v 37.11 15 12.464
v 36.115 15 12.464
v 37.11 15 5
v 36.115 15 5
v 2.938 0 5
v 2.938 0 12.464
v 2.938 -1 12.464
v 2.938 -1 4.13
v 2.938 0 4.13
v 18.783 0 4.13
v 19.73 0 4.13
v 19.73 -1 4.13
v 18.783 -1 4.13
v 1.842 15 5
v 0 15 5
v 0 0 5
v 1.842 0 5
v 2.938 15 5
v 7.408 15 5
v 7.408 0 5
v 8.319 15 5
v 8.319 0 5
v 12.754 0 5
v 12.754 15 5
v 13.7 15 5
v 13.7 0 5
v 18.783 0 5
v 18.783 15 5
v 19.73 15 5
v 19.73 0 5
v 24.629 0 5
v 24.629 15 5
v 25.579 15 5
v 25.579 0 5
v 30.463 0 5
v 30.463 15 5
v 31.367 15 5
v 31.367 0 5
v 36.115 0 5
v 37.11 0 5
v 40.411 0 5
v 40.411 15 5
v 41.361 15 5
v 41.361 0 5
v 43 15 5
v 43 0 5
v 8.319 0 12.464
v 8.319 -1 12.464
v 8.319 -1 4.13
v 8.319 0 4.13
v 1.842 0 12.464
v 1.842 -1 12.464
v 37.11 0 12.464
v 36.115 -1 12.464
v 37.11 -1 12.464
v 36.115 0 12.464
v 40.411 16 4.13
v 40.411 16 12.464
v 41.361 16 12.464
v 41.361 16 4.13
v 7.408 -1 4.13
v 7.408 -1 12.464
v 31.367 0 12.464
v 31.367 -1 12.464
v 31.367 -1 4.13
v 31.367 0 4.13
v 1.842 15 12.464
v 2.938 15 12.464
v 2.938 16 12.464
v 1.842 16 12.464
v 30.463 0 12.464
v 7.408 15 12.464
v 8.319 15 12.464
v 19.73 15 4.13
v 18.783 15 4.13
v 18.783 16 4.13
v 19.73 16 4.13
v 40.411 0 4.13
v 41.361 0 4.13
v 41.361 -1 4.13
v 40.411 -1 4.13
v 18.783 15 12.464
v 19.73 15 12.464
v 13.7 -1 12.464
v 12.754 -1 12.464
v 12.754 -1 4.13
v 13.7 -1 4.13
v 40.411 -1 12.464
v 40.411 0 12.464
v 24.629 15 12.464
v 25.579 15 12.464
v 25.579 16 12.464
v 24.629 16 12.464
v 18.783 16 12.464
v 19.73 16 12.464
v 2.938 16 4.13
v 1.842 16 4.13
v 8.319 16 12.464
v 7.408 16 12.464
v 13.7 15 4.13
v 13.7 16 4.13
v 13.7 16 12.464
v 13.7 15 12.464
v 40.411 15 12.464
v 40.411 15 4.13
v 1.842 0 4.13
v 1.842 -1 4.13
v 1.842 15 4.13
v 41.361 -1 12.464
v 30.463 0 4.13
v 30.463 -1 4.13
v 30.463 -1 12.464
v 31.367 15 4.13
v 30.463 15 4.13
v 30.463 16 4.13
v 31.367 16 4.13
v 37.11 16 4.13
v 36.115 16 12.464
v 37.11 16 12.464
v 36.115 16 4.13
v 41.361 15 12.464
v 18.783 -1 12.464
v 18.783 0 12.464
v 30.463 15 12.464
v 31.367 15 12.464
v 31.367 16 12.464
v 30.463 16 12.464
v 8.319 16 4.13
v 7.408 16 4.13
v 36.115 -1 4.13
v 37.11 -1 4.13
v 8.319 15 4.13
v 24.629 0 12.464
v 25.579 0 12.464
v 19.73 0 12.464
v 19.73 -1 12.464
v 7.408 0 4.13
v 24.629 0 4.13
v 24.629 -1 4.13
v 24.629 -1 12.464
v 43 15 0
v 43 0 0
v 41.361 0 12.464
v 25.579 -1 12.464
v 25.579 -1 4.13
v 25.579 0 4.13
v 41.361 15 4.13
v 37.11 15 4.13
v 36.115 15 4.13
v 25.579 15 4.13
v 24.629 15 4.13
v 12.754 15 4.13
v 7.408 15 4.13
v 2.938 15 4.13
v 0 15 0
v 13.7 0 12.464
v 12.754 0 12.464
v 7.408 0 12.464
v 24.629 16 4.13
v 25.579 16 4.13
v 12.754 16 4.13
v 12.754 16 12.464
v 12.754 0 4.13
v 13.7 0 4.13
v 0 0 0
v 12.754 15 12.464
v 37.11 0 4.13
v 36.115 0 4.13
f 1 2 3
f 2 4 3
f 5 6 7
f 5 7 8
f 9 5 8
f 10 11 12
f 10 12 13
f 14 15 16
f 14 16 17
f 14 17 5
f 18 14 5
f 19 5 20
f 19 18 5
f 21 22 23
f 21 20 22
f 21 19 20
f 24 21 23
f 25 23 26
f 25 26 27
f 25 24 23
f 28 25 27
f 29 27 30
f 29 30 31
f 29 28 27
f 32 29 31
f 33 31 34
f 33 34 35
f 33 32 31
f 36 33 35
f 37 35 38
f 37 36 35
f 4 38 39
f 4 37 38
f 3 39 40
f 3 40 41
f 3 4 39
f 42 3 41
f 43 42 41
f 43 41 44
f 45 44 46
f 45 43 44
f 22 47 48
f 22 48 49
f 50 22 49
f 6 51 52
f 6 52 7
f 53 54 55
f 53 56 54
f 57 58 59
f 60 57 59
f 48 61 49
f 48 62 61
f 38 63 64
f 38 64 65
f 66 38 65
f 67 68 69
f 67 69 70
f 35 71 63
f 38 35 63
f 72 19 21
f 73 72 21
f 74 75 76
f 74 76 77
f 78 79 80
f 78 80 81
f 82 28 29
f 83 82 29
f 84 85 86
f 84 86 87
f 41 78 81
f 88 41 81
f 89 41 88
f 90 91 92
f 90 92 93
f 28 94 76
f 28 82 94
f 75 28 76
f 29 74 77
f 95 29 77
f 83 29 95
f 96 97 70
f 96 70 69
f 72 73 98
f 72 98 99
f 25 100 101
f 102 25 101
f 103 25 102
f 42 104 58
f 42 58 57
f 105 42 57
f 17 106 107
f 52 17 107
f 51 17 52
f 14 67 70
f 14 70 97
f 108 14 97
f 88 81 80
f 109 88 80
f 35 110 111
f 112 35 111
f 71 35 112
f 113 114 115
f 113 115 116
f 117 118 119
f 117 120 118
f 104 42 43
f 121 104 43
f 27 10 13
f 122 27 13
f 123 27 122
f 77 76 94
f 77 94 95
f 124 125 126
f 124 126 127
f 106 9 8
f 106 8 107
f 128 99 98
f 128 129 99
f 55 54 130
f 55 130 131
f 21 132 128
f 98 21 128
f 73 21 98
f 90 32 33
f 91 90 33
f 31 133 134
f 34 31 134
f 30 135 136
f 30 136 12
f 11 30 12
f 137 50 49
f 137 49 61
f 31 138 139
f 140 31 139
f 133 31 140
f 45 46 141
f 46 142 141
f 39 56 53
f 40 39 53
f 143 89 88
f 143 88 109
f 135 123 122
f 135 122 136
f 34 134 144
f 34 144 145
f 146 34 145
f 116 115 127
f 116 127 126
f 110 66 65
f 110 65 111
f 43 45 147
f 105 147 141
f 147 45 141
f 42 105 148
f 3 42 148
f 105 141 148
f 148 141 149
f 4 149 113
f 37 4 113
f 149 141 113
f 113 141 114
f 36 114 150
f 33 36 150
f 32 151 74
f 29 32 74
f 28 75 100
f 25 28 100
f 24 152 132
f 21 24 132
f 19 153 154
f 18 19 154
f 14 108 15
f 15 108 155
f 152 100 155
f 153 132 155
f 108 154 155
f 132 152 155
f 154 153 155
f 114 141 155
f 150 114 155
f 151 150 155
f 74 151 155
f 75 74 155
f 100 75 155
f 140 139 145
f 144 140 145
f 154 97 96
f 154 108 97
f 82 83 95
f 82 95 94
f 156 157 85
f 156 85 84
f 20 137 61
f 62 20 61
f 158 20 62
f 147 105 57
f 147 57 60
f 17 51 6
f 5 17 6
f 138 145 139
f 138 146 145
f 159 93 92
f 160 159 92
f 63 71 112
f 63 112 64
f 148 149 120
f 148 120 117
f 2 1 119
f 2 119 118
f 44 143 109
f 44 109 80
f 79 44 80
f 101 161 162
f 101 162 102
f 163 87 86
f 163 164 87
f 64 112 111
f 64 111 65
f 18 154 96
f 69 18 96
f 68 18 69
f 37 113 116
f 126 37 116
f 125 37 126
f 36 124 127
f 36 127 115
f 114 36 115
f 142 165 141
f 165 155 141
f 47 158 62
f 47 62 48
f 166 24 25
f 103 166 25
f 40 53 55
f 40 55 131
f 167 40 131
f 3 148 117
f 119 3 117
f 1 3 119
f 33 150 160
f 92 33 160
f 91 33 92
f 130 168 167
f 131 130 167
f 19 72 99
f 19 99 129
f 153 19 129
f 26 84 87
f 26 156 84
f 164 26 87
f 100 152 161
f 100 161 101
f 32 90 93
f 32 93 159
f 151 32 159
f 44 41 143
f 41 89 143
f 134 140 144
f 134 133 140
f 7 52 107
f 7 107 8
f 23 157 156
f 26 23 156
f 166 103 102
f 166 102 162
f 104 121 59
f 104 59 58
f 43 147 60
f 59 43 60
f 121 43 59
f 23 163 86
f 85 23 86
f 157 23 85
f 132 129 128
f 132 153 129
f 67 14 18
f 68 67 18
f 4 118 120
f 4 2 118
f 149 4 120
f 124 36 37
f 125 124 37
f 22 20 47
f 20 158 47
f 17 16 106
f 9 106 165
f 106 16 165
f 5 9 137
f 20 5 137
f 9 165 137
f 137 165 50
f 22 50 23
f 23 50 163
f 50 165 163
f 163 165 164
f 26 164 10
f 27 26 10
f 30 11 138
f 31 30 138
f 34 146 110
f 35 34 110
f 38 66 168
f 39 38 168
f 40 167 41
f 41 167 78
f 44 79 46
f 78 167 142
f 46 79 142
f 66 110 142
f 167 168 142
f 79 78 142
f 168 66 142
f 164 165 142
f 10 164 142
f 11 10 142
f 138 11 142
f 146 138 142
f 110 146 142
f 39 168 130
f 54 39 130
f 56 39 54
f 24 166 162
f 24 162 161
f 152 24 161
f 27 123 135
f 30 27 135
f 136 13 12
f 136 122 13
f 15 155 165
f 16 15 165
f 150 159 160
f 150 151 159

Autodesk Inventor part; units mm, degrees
ref_plane "YZ Plane" through (0, 0, 0) normal (1, 0, 0) x (0, 1, 0)
ref_plane "XZ Plane" through (0, 0, 0) normal (0, 1, 0) x (-1, 0, 0)
ref_plane "XY Plane" through (0, 0, 0) normal (0, 0, 1) x (1, 0, 0)
sketch "Sketch1" plane through (0, 0, 0) normal (0, 0, 1) x (1, 0, 0)
  line L0 (0, 0) -> (43, 0)
  line L1 (43, 0) -> (43, 15)
  line L2 (43, 15) -> (0, 15)
  line L3 (0, 15) -> (0, 0)
  dimension "d0" = 43
  dimension "d1" = 15
extrude "Extrusion1" add sketch "Sketch1" along normal blind 5
sketch "Sketch2" plane through (0, 15, 0) normal (0, 1, 0) x (1, 0, 0)
  point P0 (0, 0)
sketch "Sketch3" plane through (0, 15, 0) normal (0, 1, 0) x (1, 0, 0)
  line L0 (1.8425, -12.4637) -> (1.8425, -4.1304)
  line L1 (1.8425, -4.1304) -> (2.9382, -4.1304)
  line L2 (2.9382, -4.1304) -> (2.9382, -12.4637)
  line L3 (2.9382, -12.4637) -> (1.8425, -12.4637)
  line L4 (1.8425, -12.4637) -> (1.8425, -4.1304)
  line L5 (7.4078, -4.1304) -> (8.3192, -4.1304)
  line L6 (8.3192, -4.1304) -> (8.3192, -12.4637)
  line L7 (8.3192, -12.4637) -> (7.4078, -12.4637)
  line L8 (7.4078, -12.4637) -> (7.4078, -4.1304)
  line L9 (12.7537, -4.1304) -> (13.7002, -4.1304)
  line L10 (13.7002, -4.1304) -> (13.7002, -12.4637)
  line L11 (13.7002, -12.4637) -> (12.7537, -12.4637)
  line L12 (12.7537, -12.4637) -> (12.7537, -4.1304)
  line L13 (18.7833, -4.1304) -> (19.7298, -4.1304)
  line L14 (19.7298, -4.1304) -> (19.7298, -12.4637)
  line L15 (19.7298, -12.4637) -> (18.7833, -12.4637)
  line L16 (18.7833, -12.4637) -> (18.7833, -4.1304)
  line L17 (24.6292, -4.1304) -> (25.5788, -4.1304)
  line L18 (25.5788, -4.1304) -> (25.5788, -12.4637)
  line L19 (25.5788, -12.4637) -> (24.6292, -12.4637)
  line L20 (24.6292, -12.4637) -> (24.6292, -4.1304)
  line L21 (30.4626, -4.1304) -> (31.367, -4.1304)
  line L22 (31.367, -4.1304) -> (31.367, -12.4637)
  line L23 (31.367, -12.4637) -> (30.4626, -12.4637)
  line L24 (30.4626, -12.4637) -> (30.4626, -4.1304)
  line L25 (36.1151, -4.1304) -> (37.11, -4.1304)
  line L26 (37.11, -4.1304) -> (37.11, -12.4637)
  line L27 (37.11, -12.4637) -> (36.1151, -12.4637)
  line L28 (36.1151, -12.4637) -> (36.1151, -4.1304)
  line L29 (40.4111, -4.1304) -> (41.3607, -4.1304)
  line L30 (41.3607, -4.1304) -> (41.3607, -12.4637)
  line L31 (41.3607, -12.4637) -> (40.4111, -12.4637)
  line L32 (40.4111, -12.4637) -> (40.4111, -4.1304)
  line L33 (1.8425, -4.1304) -> (2.9382, -4.1304)
  line L34 (7.4078, -4.1304) -> (8.3192, -4.1304)
  line L35 (12.7537, -4.1304) -> (13.7002, -4.1304)
  line L36 (18.7833, -4.1304) -> (19.7298, -4.1304)
  line L37 (24.6292, -4.1304) -> (25.5788, -4.1304)
  line L38 (30.4626, -4.1304) -> (31.367, -4.1304)
  line L39 (36.1151, -4.1304) -> (37.11, -4.1304)
  line L40 (40.4111, -4.1304) -> (41.3607, -4.1304)
  line L41 (41.3607, -12.4637) -> (40.4111, -12.4637)
  line L42 (37.11, -12.4637) -> (36.1151, -12.4637)
  line L43 (31.367, -12.4637) -> (30.4626, -12.4637)
  line L44 (25.5788, -12.4637) -> (24.6292, -12.4637)
  line L45 (19.7298, -12.4637) -> (18.7833, -12.4637)
  line L46 (13.7002, -12.4637) -> (12.7537, -12.4637)
  line L47 (8.3192, -12.4637) -> (7.4078, -12.4637)
  line L48 (2.9382, -12.4637) -> (1.8425, -12.4637)
  point P0 (0, 0)
extrude "Extrusion2" add sketch "Sketch3" along normal blind 1
sketch "Sketch4" plane through (0, 0, 0) normal (0, -1, 0) x (1, 0, 0)
  line L0 (41.3607, 4.1304) -> (40.4111, 4.1304) projected
  line L1 (40.4111, 4.1304) -> (40.4111, 12.4637) projected
  line L2 (41.3607, 4.1304) -> (40.4111, 4.1304)
  line L3 (40.4111, 4.1304) -> (40.4111, 12.4637)
  line L4 (40.4111, 12.4637) -> (41.3607, 12.4637)
  line L5 (41.3607, 12.4637) -> (41.3607, 4.1304)
  line L6 (36.1151, 4.1304) -> (37.11, 4.1304) projected
  line L7 (36.1151, 5) -> (36.1151, 12.4637) projected
  line L8 (37.11, 4.1304) -> (36.1151, 4.1304)
  line L9 (36.1151, 4.1304) -> (36.1151, 12.4637)
  line L10 (36.1151, 12.4637) -> (37.11, 12.4637)
  line L11 (37.11, 12.4637) -> (37.11, 4.1304)
  line L12 (30.4626, 4.1304) -> (30.4626, 12.4637) projected
  line L13 (31.367, 4.1304) -> (30.4626, 4.1304)
  line L14 (30.4626, 4.1304) -> (30.4626, 12.4637)
  line L15 (30.4626, 12.4637) -> (31.367, 12.4637)
  line L16 (31.367, 12.4637) -> (31.367, 4.1304)
  line L17 (25.5788, 4.1304) -> (24.6292, 4.1304) projected
  line L18 (24.6292, 4.1304) -> (24.6292, 12.4637) projected
  line L19 (25.5788, 4.1304) -> (24.6292, 4.1304)
  line L20 (24.6292, 4.1304) -> (24.6292, 12.4637)
  line L21 (24.6292, 12.4637) -> (25.5788, 12.4637)
  line L22 (25.5788, 12.4637) -> (25.5788, 4.1304)
  line L23 (19.7298, 12.4637) -> (19.7298, 4.1304) projected
  line L24 (18.7833, 4.1304) -> (18.7833, 12.4637) projected
  line L25 (19.7298, 4.1304) -> (18.7833, 4.1304)
  line L26 (18.7833, 4.1304) -> (18.7833, 12.4637)
  line L27 (18.7833, 12.4637) -> (19.7298, 12.4637)
  line L28 (19.7298, 12.4637) -> (19.7298, 4.1304)
  line L29 (13.7002, 4.1304) -> (13.7002, 5) projected
  line L30 (12.7537, 4.1304) -> (12.7537, 12.4637) projected
  line L31 (13.7002, 4.1304) -> (12.7537, 4.1304)
  line L32 (12.7537, 4.1304) -> (12.7537, 12.4637)
  line L33 (12.7537, 12.4637) -> (13.7002, 12.4637)
  line L34 (13.7002, 12.4637) -> (13.7002, 4.1304)
  line L35 (8.3192, 4.1304) -> (8.3192, 5) projected
  line L36 (7.4078, 4.1304) -> (7.4078, 12.4637) projected
  line L37 (8.3192, 4.1304) -> (7.4078, 4.1304)
  line L38 (7.4078, 4.1304) -> (7.4078, 12.4637)
  line L39 (7.4078, 12.4637) -> (8.3192, 12.4637)
  line L40 (8.3192, 12.4637) -> (8.3192, 4.1304)
  line L41 (2.9382, 4.1304) -> (1.8425, 4.1304) projected
  line L42 (1.8425, 4.1304) -> (1.8425, 12.4637) projected
  line L43 (2.9382, 4.1304) -> (1.8425, 4.1304)
  line L44 (1.8425, 4.1304) -> (1.8425, 12.4637)
  line L45 (1.8425, 12.4637) -> (2.9382, 12.4637)
  line L46 (2.9382, 12.4637) -> (2.9382, 4.1304)
  point P0 (0, 0)
extrude "Extrusion3" add sketch "Sketch4" along normal blind 1
properties part number "hbridge"
